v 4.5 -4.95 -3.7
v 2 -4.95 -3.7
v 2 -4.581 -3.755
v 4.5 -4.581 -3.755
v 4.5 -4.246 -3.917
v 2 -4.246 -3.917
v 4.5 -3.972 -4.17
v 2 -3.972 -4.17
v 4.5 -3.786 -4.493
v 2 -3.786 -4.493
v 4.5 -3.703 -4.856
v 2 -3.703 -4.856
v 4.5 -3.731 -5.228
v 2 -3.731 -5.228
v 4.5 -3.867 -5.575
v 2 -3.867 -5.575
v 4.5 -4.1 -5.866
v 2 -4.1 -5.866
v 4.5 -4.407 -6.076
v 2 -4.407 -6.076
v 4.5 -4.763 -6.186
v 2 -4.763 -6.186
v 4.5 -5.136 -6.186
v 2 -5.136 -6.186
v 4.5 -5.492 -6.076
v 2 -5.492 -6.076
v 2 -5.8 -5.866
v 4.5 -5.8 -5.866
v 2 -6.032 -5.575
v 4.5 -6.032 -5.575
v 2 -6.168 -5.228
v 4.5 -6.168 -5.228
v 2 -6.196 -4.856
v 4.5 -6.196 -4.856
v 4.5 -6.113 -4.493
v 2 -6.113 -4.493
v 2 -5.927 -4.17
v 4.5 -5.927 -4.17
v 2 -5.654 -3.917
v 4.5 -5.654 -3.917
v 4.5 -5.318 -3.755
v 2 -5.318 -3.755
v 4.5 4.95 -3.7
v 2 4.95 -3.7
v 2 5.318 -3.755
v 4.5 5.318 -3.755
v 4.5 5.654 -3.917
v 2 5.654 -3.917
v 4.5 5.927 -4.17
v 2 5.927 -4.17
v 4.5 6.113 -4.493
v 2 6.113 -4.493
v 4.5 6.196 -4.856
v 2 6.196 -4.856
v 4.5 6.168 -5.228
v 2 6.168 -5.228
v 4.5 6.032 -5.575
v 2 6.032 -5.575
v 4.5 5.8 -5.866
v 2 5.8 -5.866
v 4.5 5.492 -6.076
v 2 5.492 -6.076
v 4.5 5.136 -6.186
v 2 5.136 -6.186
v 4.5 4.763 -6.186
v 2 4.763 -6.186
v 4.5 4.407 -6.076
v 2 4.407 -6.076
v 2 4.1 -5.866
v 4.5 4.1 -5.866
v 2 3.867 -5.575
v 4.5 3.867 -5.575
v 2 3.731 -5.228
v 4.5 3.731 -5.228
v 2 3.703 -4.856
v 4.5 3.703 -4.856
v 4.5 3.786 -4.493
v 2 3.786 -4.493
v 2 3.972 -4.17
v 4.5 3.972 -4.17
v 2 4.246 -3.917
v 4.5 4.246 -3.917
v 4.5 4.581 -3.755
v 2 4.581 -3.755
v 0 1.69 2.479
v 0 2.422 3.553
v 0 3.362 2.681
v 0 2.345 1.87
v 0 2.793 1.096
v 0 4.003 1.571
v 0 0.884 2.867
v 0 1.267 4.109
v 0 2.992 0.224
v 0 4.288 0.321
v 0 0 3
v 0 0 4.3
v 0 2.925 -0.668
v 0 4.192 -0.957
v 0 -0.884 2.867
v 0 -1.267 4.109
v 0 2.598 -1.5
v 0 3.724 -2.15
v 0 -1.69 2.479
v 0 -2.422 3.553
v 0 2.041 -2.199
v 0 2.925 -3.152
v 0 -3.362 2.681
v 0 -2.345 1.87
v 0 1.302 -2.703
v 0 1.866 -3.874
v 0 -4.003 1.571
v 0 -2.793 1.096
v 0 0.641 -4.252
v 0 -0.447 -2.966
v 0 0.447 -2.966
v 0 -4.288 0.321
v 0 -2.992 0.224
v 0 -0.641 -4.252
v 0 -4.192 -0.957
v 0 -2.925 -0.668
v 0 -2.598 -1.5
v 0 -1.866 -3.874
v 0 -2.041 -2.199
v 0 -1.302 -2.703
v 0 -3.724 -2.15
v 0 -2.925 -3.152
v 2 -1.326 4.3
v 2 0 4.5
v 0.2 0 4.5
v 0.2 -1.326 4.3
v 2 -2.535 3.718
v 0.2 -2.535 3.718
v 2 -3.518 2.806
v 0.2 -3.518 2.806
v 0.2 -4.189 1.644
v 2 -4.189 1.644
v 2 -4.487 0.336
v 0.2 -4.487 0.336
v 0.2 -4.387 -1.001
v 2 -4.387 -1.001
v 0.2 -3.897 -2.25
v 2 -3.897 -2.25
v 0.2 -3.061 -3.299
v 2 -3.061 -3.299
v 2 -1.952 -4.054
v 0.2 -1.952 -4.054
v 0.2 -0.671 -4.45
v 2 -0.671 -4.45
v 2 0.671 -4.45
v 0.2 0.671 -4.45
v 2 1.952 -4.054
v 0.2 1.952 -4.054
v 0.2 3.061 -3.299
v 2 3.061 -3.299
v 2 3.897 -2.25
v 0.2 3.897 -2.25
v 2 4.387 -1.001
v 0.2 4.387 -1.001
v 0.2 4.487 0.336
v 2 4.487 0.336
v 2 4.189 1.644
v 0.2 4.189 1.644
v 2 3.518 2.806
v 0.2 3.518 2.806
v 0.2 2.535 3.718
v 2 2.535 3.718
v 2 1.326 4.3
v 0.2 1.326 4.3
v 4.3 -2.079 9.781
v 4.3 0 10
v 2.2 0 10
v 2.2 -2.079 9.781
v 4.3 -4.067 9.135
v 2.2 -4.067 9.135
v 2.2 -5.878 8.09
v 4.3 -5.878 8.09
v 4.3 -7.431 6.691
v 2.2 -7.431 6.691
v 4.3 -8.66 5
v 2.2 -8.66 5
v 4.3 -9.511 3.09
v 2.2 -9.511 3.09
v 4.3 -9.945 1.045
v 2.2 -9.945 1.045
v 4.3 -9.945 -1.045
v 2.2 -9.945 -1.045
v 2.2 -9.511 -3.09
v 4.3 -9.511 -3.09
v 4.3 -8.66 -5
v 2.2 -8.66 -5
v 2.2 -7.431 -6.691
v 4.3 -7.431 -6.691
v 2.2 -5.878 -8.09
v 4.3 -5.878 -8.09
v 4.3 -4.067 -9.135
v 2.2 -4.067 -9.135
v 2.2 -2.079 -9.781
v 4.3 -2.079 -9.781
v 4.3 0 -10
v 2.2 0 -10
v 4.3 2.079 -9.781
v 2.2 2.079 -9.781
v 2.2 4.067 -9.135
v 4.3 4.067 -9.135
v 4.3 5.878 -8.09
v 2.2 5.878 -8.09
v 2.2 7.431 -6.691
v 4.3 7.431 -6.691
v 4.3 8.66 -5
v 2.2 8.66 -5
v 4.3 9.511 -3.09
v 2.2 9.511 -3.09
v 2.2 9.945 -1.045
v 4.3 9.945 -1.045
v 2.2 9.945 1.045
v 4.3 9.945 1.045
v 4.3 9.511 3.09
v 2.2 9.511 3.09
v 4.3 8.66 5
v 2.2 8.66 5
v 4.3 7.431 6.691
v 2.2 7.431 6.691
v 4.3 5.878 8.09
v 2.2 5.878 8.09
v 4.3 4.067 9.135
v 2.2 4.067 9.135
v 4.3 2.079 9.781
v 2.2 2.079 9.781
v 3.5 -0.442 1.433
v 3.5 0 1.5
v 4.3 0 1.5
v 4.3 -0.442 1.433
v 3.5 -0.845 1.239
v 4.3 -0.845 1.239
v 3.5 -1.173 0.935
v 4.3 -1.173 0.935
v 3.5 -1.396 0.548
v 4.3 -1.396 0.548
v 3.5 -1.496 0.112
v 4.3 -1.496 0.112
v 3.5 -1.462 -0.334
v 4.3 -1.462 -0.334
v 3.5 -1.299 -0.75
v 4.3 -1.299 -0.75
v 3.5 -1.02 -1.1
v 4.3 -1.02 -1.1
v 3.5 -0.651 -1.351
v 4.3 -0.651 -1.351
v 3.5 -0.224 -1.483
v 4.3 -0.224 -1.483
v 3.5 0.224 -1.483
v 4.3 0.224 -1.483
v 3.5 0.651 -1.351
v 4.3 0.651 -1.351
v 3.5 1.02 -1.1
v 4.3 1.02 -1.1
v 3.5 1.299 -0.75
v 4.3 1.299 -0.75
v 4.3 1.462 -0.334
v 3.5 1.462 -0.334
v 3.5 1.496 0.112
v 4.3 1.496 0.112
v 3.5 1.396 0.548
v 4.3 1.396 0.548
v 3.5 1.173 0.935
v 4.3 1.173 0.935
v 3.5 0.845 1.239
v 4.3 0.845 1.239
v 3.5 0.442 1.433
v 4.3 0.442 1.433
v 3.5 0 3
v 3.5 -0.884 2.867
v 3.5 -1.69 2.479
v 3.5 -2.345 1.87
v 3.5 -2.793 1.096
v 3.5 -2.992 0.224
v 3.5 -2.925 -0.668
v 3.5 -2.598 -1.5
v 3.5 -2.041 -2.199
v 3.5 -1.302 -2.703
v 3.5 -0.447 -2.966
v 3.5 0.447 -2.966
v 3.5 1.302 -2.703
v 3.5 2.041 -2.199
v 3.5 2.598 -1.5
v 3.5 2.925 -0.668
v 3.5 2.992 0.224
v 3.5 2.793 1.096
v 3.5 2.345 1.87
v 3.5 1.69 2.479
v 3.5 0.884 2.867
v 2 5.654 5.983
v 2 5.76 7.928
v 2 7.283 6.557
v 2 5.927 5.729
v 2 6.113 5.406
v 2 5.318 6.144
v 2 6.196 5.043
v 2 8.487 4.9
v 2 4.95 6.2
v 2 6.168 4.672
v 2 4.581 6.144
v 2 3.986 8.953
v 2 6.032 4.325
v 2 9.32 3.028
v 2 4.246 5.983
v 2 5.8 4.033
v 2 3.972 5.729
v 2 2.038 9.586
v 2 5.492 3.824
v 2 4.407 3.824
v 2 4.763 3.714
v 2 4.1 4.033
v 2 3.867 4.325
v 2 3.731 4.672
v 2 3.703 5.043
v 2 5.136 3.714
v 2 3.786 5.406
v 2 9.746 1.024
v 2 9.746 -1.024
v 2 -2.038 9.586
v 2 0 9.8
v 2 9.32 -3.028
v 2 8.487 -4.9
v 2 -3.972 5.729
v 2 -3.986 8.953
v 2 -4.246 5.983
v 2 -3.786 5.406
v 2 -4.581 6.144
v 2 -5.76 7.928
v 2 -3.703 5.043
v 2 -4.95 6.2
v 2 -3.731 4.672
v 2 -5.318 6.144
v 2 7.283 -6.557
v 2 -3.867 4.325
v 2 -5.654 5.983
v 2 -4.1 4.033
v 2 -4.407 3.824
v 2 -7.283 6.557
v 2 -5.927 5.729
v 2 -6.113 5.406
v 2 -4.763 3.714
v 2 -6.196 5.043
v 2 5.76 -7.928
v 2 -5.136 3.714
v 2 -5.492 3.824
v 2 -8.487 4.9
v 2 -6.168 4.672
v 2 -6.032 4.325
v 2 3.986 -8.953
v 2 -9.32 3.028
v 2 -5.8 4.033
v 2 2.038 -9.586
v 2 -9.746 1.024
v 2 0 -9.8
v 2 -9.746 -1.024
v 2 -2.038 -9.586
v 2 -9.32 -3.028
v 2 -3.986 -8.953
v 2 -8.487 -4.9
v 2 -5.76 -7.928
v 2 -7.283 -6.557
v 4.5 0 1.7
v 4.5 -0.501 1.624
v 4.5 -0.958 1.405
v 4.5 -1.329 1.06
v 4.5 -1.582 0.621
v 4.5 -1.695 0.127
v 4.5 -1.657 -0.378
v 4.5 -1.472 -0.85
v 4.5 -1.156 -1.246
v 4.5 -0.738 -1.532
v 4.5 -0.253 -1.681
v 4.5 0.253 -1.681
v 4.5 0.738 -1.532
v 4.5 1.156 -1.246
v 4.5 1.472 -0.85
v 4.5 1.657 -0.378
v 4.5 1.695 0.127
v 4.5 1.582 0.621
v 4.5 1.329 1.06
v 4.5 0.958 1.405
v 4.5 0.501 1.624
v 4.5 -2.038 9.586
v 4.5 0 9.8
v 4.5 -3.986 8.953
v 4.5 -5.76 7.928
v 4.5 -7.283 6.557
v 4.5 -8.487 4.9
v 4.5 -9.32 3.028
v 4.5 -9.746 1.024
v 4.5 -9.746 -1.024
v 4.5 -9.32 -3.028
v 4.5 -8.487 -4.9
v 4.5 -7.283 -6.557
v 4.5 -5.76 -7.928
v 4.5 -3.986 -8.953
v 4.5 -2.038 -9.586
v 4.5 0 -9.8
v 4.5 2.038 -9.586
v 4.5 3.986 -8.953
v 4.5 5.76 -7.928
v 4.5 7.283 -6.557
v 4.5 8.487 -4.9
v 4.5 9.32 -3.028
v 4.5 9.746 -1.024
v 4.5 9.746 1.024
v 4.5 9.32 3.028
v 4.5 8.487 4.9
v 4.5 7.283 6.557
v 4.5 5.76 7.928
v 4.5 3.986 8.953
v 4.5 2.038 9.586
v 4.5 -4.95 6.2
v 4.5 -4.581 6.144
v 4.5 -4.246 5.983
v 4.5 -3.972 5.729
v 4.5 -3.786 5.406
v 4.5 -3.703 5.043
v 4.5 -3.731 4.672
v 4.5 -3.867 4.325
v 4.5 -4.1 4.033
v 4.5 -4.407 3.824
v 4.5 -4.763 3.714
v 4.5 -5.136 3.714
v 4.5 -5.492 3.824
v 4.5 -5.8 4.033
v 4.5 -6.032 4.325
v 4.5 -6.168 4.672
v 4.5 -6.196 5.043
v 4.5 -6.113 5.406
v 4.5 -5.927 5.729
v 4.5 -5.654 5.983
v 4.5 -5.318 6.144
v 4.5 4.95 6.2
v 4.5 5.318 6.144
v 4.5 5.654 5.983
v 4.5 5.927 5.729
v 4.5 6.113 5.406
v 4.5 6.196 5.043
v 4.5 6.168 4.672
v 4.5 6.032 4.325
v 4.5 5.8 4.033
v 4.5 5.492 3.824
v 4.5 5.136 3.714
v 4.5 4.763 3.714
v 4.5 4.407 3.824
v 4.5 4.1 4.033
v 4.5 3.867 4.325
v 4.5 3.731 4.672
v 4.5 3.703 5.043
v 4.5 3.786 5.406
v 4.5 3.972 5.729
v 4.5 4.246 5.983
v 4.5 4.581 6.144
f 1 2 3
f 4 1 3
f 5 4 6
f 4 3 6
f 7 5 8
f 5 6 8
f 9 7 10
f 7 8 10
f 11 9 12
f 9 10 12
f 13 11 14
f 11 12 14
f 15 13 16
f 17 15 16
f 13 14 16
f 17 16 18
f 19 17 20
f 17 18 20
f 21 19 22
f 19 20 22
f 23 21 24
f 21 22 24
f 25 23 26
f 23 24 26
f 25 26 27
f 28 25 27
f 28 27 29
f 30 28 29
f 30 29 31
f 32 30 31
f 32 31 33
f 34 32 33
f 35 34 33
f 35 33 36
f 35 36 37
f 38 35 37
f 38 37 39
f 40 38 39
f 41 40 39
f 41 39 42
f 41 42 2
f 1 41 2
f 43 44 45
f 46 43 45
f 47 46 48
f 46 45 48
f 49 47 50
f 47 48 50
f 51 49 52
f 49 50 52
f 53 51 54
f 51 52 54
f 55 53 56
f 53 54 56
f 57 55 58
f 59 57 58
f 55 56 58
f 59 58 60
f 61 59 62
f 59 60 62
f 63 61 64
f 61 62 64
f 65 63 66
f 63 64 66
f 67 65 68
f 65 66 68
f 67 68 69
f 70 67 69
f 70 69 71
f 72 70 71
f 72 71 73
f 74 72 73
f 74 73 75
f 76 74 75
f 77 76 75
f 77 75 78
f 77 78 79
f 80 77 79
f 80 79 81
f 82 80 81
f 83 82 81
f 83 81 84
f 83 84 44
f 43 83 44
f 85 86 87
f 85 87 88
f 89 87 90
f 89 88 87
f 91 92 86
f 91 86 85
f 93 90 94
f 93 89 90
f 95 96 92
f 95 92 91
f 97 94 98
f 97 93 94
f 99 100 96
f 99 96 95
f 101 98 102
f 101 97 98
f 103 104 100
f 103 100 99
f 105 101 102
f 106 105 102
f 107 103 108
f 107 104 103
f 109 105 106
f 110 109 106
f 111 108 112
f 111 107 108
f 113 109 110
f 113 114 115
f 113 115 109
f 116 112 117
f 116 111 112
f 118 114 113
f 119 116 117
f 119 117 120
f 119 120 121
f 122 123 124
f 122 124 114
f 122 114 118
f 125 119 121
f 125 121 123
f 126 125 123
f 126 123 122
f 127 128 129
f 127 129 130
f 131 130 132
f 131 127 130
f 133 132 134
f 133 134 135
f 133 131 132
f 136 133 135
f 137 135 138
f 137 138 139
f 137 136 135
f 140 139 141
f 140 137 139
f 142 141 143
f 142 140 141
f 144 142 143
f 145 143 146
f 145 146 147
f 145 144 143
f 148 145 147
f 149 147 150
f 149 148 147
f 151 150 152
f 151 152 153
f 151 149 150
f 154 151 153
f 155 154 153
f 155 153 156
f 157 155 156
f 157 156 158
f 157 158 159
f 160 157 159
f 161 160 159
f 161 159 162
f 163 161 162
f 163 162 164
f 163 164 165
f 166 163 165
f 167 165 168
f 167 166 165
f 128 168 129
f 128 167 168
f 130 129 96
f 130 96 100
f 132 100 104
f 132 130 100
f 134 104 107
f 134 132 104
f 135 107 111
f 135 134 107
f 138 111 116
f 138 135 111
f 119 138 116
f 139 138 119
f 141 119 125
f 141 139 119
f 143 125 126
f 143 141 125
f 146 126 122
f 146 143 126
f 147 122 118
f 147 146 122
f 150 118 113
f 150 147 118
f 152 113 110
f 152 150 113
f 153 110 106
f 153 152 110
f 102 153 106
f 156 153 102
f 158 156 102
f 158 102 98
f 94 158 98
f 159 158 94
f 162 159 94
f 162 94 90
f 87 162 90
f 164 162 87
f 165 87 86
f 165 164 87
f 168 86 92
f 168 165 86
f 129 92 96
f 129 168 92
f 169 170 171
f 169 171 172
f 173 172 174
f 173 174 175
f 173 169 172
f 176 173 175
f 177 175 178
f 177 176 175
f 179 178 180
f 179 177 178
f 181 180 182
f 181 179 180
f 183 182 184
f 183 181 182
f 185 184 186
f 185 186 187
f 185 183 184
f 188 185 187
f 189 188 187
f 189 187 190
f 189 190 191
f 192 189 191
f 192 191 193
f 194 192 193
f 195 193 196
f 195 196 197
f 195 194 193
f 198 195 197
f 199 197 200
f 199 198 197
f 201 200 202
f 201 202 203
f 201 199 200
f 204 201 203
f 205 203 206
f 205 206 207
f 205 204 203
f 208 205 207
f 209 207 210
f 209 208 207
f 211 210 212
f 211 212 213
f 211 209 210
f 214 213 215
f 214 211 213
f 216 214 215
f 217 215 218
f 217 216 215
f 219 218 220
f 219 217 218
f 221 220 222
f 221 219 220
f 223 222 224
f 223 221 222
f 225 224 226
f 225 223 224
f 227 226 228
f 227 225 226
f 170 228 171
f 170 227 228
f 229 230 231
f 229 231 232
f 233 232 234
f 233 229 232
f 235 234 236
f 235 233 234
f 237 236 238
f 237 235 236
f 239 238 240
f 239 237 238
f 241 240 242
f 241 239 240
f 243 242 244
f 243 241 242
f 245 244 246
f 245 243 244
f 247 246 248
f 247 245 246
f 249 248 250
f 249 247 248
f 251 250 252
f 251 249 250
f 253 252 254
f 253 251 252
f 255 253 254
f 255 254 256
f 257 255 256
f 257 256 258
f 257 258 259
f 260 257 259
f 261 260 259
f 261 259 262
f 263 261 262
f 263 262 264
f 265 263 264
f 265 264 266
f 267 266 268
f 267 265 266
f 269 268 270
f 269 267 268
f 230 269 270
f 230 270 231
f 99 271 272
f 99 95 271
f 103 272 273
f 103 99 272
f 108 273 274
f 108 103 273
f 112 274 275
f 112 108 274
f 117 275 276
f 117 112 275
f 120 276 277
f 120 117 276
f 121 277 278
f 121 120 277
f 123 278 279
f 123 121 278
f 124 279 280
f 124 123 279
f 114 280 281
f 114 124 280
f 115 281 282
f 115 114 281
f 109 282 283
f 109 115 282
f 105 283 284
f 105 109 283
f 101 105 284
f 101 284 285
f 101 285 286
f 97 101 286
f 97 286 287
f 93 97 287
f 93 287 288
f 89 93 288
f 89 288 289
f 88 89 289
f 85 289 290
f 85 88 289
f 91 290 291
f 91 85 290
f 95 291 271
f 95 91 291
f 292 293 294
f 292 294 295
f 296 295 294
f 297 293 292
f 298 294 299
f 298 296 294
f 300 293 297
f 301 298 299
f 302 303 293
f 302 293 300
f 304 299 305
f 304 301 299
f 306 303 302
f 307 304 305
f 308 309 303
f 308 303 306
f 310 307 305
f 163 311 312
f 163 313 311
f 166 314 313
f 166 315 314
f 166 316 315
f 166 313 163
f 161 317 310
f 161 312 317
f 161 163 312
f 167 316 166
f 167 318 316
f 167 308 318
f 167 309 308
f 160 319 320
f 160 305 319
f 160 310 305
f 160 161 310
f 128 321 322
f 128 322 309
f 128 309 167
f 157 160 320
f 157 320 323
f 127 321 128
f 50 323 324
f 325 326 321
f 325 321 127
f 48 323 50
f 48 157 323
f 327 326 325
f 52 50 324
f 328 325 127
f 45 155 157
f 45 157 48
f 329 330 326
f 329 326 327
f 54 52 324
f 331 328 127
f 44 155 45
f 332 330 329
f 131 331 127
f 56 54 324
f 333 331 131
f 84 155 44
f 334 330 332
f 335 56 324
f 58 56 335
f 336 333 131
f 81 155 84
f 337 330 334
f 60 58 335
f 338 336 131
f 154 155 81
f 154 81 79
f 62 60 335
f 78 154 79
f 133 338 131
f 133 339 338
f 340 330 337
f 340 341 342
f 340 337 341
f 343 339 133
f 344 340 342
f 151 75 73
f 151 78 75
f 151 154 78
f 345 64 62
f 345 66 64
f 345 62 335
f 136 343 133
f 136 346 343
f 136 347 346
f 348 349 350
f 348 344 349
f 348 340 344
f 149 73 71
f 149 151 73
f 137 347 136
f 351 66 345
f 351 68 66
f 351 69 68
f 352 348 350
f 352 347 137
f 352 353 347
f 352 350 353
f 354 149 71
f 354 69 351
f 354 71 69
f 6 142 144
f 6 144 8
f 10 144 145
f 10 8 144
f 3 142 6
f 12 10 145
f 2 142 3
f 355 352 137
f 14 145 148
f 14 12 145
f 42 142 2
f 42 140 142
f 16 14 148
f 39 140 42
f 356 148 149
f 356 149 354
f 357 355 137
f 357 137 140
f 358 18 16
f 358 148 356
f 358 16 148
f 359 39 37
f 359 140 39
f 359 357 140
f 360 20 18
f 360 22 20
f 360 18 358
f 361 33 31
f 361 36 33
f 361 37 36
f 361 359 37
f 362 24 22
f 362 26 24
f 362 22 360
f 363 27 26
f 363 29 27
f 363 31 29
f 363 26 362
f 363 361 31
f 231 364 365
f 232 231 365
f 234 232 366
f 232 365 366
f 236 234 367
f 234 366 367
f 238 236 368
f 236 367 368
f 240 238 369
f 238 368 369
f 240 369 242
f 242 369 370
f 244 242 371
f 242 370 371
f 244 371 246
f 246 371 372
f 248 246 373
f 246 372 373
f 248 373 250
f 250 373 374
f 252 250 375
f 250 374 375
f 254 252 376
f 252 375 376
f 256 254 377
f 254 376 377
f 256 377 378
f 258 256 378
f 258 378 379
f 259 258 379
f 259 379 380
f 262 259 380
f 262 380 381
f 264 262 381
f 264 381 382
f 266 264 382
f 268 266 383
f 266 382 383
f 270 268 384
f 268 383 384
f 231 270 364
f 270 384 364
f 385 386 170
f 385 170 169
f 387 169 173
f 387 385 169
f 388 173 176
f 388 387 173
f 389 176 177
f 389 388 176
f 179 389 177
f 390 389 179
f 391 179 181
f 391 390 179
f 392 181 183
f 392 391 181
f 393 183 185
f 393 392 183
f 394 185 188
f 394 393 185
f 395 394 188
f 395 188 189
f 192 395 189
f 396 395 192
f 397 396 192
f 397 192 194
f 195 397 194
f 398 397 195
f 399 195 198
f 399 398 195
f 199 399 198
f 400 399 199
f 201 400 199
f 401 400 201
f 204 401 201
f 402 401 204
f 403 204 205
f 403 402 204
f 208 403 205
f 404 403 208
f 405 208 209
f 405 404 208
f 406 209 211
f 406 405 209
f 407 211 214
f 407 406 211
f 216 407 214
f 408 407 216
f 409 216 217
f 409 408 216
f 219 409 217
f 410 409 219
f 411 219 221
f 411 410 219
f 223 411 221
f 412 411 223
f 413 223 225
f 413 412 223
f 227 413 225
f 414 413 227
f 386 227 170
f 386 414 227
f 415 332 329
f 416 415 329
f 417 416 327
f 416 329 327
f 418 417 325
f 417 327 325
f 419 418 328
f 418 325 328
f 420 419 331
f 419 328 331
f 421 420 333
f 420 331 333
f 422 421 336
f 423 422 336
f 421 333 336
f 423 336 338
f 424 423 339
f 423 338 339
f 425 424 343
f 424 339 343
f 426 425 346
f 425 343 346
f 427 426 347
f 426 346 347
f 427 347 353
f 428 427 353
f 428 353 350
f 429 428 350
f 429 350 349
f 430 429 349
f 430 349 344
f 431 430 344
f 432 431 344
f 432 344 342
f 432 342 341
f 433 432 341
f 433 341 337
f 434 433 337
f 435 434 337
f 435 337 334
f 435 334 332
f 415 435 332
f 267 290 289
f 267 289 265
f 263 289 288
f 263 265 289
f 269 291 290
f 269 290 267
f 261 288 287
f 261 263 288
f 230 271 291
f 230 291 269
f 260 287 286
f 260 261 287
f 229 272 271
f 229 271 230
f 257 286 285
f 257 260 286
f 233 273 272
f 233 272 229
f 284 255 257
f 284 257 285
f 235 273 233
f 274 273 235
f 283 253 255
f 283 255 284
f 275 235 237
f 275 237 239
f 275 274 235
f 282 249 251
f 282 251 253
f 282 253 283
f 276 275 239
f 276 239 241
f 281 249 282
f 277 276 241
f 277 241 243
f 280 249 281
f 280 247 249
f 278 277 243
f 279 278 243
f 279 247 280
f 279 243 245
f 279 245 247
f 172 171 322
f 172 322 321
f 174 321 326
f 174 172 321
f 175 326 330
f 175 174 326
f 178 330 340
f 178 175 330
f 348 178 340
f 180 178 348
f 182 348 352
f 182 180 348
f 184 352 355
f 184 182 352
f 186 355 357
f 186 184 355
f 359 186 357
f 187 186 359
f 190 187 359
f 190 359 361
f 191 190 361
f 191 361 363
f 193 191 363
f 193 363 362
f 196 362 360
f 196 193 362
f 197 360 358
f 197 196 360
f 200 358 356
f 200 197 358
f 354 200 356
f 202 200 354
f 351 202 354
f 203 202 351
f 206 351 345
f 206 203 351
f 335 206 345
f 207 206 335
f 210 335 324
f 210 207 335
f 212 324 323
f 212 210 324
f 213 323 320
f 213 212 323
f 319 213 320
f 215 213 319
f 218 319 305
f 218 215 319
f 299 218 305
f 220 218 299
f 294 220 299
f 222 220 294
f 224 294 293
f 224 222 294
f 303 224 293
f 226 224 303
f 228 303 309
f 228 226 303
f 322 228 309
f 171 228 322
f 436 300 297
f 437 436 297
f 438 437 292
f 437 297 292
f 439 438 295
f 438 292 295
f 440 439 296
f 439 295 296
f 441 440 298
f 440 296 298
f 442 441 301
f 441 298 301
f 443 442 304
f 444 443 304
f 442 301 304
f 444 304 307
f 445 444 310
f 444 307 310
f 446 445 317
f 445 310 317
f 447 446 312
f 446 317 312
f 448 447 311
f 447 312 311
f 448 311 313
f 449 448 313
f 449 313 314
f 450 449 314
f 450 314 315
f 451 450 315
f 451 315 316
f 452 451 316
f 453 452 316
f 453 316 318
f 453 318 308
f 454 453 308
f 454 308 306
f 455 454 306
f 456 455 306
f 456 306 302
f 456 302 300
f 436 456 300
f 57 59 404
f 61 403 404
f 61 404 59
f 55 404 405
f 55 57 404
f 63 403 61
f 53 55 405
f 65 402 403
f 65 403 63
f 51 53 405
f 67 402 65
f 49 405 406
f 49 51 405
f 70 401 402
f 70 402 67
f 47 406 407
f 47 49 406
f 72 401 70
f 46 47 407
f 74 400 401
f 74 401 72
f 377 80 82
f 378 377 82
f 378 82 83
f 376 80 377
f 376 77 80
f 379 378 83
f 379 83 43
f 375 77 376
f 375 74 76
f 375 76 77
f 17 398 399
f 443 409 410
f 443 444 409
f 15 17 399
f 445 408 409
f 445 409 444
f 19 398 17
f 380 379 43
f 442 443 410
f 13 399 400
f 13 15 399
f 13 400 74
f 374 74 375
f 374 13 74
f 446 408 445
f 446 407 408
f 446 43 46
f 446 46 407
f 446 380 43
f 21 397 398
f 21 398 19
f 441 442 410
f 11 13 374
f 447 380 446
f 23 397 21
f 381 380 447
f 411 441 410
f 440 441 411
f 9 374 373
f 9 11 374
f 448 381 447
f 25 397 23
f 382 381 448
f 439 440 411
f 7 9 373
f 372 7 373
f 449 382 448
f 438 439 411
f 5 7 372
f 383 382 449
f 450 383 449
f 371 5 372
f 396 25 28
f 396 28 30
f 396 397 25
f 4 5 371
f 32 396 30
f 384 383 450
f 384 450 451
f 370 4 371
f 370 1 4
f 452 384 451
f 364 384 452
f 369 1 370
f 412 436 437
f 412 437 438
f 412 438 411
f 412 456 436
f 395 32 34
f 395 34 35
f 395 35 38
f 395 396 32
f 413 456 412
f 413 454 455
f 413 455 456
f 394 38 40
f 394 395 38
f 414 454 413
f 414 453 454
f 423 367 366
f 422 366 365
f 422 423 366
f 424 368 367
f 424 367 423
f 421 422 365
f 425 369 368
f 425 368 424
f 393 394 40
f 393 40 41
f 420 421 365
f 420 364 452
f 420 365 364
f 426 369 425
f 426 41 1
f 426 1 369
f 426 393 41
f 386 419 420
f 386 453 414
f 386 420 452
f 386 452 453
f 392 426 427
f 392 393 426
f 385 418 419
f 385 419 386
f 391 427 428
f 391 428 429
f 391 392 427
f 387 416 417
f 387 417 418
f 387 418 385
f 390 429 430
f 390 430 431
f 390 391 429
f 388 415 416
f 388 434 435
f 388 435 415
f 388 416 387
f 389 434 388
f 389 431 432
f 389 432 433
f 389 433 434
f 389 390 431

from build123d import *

# Parameters (mm, degrees)
SKETCH_3_R          = 1.25
CUT_EXTRUDE_1_DEPTH = 15.361406616
CHAMFER_1_SIZE      = 0.2


with BuildPart() as part:
    # 草图2 → 旋转1 (revolve)
    with BuildSketch(Plane.XY, mode=Mode.PRIVATE) as revolve_1_sk:
        Polygon((0, 3), (0, 4.5), (2, 4.5), (2, 10), (4.5, 10), (4.5, 1.5), (3.5, 1.5), (3.5, 3), align=None)
    revolve(revolve_1_sk.sketch.rotate(Axis((0, 0, 0), (1, 0, 0)), 90), axis=Axis((0, 0, 0), (1, 0, 0)))

    # 草图3 → 切除-拉伸1 (cut, through all)
    with BuildSketch(Plane.ZY.offset(-2)):
        with Locations((4.949747468, 4.949747468)):
            Circle(SKETCH_3_R)
        with Locations((4.949747468, -4.949747468)):
            Circle(SKETCH_3_R)
        with Locations((-4.949747468, -4.949747468)):
            Circle(SKETCH_3_R)
        with Locations((-4.949747468, 4.949747468)):
            Circle(SKETCH_3_R)
    extrude(amount=-CUT_EXTRUDE_1_DEPTH, mode=Mode.SUBTRACT)

    # 倒角1
    chamfer_1_edges = [part.edges().sort_by_distance(p)[0] for p in [
        (4.5, 0, -1.5),
        (4.5, 0, -10),
        (2, 0, -10),
        (0, 0, -4.5),
    ]]
    chamfer(chamfer_1_edges, length=CHAMFER_1_SIZE)


solid = part.part
